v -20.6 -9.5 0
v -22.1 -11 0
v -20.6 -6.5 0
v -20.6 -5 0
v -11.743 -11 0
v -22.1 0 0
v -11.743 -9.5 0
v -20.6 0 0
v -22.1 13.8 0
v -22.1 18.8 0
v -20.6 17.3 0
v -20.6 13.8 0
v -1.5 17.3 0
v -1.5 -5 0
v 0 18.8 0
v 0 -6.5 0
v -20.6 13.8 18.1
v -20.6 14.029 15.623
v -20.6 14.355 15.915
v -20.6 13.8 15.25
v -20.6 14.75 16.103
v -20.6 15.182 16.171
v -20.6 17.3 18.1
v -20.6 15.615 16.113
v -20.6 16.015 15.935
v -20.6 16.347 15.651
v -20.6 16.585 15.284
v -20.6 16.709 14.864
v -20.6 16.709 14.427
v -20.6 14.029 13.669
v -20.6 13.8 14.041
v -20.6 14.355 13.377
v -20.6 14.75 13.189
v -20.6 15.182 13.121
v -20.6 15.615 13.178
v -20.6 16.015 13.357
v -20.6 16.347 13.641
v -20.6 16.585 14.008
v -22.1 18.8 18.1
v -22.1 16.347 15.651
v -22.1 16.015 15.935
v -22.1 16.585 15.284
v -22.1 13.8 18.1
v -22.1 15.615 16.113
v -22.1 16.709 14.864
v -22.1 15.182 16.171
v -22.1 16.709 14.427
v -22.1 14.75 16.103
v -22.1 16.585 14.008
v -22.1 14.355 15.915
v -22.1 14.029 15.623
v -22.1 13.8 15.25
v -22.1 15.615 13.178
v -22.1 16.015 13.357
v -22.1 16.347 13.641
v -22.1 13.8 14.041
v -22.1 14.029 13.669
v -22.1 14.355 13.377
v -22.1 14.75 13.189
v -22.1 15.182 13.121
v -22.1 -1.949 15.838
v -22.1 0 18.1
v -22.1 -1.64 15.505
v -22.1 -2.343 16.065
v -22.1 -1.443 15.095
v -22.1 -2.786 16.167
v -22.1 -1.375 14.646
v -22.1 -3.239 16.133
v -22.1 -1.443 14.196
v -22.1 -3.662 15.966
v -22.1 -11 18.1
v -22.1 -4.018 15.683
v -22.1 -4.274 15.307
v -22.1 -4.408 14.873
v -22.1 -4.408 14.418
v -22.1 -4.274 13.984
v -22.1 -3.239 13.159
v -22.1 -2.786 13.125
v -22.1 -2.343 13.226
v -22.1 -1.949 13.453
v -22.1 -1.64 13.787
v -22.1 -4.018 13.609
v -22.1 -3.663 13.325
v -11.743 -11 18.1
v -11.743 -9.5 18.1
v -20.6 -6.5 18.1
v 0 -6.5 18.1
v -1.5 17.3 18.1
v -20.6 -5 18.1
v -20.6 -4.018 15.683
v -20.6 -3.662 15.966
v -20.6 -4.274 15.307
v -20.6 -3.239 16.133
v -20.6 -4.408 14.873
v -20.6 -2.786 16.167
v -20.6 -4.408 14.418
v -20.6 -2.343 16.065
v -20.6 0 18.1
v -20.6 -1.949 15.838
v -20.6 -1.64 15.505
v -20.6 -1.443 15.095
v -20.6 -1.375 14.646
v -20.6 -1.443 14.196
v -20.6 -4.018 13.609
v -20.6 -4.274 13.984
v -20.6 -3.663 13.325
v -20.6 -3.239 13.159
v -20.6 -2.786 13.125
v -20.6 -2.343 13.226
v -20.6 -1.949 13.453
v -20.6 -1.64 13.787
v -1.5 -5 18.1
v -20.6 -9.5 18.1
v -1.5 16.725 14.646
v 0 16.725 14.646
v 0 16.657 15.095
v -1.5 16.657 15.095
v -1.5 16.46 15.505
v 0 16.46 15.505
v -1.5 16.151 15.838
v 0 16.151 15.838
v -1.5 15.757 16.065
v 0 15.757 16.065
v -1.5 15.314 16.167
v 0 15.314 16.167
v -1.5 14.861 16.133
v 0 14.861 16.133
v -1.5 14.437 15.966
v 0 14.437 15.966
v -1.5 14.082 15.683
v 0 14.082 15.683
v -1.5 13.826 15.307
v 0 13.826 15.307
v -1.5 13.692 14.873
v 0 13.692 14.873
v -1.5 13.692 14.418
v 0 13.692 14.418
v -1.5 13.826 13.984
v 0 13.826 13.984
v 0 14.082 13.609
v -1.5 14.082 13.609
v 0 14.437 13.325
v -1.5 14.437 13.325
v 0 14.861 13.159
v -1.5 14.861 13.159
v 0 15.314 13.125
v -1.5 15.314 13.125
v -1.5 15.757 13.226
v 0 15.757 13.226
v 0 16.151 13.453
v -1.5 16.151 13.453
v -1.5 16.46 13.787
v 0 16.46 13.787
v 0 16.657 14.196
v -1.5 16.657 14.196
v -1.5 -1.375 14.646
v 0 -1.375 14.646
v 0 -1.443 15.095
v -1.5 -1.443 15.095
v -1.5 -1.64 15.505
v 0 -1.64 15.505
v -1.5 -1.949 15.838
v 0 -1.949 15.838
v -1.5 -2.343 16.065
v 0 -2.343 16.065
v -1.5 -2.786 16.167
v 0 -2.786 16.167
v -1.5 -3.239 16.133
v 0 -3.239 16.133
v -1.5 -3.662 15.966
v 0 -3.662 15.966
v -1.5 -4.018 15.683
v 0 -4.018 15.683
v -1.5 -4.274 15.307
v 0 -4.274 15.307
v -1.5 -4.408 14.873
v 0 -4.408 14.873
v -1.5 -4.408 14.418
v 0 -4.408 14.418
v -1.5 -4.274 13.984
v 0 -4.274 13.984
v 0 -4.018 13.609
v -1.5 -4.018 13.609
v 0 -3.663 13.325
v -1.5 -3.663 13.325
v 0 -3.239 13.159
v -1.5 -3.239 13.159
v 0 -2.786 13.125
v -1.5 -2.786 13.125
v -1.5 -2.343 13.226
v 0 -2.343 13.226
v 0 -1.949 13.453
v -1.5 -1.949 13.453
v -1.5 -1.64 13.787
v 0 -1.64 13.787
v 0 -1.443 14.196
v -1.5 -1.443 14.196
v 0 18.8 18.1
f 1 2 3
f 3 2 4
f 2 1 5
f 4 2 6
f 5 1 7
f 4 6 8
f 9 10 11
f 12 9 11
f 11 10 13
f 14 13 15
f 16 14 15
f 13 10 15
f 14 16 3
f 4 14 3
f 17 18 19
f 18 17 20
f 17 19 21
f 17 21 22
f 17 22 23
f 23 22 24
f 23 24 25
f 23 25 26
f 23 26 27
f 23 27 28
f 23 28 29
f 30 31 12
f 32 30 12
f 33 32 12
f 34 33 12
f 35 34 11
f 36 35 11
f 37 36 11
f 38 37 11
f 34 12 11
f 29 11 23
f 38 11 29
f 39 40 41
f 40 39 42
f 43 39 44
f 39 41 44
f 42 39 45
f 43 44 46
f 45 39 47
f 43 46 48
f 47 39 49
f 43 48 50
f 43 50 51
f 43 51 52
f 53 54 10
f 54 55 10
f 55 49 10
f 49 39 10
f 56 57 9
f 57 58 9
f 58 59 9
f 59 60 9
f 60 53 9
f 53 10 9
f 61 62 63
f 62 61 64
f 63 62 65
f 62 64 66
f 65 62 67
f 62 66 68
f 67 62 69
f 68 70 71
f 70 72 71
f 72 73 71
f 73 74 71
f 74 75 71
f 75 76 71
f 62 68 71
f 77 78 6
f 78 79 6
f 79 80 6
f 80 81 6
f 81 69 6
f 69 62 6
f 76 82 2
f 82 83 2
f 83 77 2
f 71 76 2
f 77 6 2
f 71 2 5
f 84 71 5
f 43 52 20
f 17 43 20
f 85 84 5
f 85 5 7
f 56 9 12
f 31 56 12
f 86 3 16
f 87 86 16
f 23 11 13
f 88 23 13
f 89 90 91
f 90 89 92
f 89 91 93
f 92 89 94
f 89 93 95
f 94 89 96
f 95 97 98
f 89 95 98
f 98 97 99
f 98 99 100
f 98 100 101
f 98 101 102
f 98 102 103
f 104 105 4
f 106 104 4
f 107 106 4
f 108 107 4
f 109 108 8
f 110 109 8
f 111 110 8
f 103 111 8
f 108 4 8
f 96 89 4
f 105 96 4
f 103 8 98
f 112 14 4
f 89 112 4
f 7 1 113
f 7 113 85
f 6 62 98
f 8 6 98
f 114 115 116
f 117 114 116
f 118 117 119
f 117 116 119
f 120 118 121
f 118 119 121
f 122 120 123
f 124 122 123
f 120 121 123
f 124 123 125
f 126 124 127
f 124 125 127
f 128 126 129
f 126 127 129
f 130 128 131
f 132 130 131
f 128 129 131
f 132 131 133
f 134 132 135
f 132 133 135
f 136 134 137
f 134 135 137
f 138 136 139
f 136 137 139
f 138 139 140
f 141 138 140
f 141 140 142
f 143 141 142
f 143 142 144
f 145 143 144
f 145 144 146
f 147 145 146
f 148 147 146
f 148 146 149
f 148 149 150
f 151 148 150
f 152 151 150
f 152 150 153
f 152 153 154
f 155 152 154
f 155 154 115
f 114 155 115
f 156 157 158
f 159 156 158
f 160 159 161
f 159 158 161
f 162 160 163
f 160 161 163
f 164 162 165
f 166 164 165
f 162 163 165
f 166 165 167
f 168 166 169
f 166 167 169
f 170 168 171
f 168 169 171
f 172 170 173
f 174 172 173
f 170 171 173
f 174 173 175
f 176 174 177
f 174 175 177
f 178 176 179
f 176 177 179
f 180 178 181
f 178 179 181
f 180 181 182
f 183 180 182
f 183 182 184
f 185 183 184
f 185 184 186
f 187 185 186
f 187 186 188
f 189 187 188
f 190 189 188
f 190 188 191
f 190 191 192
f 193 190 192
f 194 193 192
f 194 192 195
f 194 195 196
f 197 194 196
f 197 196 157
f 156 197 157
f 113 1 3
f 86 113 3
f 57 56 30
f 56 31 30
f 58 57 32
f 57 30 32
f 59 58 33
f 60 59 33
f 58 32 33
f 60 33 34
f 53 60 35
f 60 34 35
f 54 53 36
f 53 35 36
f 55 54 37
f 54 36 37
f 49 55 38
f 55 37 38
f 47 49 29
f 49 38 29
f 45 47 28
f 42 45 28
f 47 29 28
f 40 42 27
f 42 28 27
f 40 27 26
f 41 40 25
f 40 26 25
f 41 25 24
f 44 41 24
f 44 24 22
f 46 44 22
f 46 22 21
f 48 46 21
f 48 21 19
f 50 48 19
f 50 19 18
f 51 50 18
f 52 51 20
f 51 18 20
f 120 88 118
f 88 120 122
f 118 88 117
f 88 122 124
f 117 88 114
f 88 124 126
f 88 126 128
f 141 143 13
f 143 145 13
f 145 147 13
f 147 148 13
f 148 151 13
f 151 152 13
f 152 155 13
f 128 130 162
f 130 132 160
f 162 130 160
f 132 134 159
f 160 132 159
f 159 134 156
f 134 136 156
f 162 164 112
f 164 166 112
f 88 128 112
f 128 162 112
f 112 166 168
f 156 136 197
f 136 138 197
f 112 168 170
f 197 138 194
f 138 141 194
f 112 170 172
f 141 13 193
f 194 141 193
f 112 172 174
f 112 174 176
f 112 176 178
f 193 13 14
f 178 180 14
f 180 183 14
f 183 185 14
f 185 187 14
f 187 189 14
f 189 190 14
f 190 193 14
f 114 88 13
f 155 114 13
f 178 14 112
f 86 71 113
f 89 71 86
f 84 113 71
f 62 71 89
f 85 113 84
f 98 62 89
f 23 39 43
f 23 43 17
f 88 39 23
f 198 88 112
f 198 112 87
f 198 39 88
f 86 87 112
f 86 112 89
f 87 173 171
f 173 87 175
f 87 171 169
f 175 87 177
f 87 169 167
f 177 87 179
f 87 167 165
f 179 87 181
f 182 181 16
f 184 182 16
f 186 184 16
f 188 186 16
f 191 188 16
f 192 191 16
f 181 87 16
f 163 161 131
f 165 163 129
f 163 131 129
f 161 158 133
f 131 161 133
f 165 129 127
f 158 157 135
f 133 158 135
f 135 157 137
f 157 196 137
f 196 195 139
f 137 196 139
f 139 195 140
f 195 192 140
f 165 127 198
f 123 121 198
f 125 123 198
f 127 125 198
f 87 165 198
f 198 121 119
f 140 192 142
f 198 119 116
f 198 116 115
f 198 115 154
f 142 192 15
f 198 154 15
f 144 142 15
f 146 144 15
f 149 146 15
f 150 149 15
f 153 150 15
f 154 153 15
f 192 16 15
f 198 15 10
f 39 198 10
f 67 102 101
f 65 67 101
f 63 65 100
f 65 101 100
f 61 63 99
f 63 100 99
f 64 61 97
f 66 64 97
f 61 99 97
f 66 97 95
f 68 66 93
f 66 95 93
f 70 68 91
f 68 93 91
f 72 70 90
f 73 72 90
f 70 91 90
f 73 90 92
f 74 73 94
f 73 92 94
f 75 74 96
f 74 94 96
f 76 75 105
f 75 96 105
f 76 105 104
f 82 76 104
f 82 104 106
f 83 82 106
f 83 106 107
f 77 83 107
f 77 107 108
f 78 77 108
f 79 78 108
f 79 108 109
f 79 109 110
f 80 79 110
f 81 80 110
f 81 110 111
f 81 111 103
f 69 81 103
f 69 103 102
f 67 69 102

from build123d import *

# Parameters (mm, degrees)
F0_W     = 1.5
F0_H     = 1.5
F0_W_2   = 19.1
F0_H_2   = 3.5
F0_H_3   = 22.3
F0_H_4   = 5
F0_H_5   = 3
F0_W_3   = 8.857275
F1_DEPTH = 18.1
F2_R     = 1.525
F3_DEPTH = 25


with BuildPart() as f1:
    # F0 (on Top) → F1 (new body)
    with BuildSketch(Plane.XY):
        with Locations((-21.35, 18.05)):
            Rectangle(F0_W, F0_H)
        with Locations((-11.05, 18.05)):
            Rectangle(F0_W_2, F0_H)
        with Locations((-21.35, 15.55)):
            Rectangle(F0_W, F0_H_2)
        with Locations((-0.75, 18.05)):
            Rectangle(F0_W, F0_H)
        with Locations((-0.75, 6.15)):
            Rectangle(F0_W, F0_H_3)
        with Locations((-0.75, -5.75)):
            Rectangle(F0_W, F0_H)
        with Locations((-11.05, -5.75)):
            Rectangle(F0_W_2, F0_H)
        with Locations((-21.35, -5.75)):
            Rectangle(F0_W, F0_H)
        with Locations((-21.35, -2.5)):
            Rectangle(F0_W, F0_H_4)
        with Locations((-21.35, -8)):
            Rectangle(F0_W, F0_H_5)
        with Locations((-16.171363, -10.25)):
            Rectangle(F0_W_3, F0_H)
        with Locations((-21.35, -10.25)):
            Rectangle(F0_W, F0_H)
    extrude(amount=F1_DEPTH)

    # F2 (on face) → F3 (cut)
    with BuildSketch(Plane.YZ):
        with Locations((-2.9, 14.645781)):
            Circle(F2_R)
        with Locations((15.2, 14.645781)):
            Circle(F2_R)
    extrude(amount=-F3_DEPTH, mode=Mode.SUBTRACT)


solid = f1.part
